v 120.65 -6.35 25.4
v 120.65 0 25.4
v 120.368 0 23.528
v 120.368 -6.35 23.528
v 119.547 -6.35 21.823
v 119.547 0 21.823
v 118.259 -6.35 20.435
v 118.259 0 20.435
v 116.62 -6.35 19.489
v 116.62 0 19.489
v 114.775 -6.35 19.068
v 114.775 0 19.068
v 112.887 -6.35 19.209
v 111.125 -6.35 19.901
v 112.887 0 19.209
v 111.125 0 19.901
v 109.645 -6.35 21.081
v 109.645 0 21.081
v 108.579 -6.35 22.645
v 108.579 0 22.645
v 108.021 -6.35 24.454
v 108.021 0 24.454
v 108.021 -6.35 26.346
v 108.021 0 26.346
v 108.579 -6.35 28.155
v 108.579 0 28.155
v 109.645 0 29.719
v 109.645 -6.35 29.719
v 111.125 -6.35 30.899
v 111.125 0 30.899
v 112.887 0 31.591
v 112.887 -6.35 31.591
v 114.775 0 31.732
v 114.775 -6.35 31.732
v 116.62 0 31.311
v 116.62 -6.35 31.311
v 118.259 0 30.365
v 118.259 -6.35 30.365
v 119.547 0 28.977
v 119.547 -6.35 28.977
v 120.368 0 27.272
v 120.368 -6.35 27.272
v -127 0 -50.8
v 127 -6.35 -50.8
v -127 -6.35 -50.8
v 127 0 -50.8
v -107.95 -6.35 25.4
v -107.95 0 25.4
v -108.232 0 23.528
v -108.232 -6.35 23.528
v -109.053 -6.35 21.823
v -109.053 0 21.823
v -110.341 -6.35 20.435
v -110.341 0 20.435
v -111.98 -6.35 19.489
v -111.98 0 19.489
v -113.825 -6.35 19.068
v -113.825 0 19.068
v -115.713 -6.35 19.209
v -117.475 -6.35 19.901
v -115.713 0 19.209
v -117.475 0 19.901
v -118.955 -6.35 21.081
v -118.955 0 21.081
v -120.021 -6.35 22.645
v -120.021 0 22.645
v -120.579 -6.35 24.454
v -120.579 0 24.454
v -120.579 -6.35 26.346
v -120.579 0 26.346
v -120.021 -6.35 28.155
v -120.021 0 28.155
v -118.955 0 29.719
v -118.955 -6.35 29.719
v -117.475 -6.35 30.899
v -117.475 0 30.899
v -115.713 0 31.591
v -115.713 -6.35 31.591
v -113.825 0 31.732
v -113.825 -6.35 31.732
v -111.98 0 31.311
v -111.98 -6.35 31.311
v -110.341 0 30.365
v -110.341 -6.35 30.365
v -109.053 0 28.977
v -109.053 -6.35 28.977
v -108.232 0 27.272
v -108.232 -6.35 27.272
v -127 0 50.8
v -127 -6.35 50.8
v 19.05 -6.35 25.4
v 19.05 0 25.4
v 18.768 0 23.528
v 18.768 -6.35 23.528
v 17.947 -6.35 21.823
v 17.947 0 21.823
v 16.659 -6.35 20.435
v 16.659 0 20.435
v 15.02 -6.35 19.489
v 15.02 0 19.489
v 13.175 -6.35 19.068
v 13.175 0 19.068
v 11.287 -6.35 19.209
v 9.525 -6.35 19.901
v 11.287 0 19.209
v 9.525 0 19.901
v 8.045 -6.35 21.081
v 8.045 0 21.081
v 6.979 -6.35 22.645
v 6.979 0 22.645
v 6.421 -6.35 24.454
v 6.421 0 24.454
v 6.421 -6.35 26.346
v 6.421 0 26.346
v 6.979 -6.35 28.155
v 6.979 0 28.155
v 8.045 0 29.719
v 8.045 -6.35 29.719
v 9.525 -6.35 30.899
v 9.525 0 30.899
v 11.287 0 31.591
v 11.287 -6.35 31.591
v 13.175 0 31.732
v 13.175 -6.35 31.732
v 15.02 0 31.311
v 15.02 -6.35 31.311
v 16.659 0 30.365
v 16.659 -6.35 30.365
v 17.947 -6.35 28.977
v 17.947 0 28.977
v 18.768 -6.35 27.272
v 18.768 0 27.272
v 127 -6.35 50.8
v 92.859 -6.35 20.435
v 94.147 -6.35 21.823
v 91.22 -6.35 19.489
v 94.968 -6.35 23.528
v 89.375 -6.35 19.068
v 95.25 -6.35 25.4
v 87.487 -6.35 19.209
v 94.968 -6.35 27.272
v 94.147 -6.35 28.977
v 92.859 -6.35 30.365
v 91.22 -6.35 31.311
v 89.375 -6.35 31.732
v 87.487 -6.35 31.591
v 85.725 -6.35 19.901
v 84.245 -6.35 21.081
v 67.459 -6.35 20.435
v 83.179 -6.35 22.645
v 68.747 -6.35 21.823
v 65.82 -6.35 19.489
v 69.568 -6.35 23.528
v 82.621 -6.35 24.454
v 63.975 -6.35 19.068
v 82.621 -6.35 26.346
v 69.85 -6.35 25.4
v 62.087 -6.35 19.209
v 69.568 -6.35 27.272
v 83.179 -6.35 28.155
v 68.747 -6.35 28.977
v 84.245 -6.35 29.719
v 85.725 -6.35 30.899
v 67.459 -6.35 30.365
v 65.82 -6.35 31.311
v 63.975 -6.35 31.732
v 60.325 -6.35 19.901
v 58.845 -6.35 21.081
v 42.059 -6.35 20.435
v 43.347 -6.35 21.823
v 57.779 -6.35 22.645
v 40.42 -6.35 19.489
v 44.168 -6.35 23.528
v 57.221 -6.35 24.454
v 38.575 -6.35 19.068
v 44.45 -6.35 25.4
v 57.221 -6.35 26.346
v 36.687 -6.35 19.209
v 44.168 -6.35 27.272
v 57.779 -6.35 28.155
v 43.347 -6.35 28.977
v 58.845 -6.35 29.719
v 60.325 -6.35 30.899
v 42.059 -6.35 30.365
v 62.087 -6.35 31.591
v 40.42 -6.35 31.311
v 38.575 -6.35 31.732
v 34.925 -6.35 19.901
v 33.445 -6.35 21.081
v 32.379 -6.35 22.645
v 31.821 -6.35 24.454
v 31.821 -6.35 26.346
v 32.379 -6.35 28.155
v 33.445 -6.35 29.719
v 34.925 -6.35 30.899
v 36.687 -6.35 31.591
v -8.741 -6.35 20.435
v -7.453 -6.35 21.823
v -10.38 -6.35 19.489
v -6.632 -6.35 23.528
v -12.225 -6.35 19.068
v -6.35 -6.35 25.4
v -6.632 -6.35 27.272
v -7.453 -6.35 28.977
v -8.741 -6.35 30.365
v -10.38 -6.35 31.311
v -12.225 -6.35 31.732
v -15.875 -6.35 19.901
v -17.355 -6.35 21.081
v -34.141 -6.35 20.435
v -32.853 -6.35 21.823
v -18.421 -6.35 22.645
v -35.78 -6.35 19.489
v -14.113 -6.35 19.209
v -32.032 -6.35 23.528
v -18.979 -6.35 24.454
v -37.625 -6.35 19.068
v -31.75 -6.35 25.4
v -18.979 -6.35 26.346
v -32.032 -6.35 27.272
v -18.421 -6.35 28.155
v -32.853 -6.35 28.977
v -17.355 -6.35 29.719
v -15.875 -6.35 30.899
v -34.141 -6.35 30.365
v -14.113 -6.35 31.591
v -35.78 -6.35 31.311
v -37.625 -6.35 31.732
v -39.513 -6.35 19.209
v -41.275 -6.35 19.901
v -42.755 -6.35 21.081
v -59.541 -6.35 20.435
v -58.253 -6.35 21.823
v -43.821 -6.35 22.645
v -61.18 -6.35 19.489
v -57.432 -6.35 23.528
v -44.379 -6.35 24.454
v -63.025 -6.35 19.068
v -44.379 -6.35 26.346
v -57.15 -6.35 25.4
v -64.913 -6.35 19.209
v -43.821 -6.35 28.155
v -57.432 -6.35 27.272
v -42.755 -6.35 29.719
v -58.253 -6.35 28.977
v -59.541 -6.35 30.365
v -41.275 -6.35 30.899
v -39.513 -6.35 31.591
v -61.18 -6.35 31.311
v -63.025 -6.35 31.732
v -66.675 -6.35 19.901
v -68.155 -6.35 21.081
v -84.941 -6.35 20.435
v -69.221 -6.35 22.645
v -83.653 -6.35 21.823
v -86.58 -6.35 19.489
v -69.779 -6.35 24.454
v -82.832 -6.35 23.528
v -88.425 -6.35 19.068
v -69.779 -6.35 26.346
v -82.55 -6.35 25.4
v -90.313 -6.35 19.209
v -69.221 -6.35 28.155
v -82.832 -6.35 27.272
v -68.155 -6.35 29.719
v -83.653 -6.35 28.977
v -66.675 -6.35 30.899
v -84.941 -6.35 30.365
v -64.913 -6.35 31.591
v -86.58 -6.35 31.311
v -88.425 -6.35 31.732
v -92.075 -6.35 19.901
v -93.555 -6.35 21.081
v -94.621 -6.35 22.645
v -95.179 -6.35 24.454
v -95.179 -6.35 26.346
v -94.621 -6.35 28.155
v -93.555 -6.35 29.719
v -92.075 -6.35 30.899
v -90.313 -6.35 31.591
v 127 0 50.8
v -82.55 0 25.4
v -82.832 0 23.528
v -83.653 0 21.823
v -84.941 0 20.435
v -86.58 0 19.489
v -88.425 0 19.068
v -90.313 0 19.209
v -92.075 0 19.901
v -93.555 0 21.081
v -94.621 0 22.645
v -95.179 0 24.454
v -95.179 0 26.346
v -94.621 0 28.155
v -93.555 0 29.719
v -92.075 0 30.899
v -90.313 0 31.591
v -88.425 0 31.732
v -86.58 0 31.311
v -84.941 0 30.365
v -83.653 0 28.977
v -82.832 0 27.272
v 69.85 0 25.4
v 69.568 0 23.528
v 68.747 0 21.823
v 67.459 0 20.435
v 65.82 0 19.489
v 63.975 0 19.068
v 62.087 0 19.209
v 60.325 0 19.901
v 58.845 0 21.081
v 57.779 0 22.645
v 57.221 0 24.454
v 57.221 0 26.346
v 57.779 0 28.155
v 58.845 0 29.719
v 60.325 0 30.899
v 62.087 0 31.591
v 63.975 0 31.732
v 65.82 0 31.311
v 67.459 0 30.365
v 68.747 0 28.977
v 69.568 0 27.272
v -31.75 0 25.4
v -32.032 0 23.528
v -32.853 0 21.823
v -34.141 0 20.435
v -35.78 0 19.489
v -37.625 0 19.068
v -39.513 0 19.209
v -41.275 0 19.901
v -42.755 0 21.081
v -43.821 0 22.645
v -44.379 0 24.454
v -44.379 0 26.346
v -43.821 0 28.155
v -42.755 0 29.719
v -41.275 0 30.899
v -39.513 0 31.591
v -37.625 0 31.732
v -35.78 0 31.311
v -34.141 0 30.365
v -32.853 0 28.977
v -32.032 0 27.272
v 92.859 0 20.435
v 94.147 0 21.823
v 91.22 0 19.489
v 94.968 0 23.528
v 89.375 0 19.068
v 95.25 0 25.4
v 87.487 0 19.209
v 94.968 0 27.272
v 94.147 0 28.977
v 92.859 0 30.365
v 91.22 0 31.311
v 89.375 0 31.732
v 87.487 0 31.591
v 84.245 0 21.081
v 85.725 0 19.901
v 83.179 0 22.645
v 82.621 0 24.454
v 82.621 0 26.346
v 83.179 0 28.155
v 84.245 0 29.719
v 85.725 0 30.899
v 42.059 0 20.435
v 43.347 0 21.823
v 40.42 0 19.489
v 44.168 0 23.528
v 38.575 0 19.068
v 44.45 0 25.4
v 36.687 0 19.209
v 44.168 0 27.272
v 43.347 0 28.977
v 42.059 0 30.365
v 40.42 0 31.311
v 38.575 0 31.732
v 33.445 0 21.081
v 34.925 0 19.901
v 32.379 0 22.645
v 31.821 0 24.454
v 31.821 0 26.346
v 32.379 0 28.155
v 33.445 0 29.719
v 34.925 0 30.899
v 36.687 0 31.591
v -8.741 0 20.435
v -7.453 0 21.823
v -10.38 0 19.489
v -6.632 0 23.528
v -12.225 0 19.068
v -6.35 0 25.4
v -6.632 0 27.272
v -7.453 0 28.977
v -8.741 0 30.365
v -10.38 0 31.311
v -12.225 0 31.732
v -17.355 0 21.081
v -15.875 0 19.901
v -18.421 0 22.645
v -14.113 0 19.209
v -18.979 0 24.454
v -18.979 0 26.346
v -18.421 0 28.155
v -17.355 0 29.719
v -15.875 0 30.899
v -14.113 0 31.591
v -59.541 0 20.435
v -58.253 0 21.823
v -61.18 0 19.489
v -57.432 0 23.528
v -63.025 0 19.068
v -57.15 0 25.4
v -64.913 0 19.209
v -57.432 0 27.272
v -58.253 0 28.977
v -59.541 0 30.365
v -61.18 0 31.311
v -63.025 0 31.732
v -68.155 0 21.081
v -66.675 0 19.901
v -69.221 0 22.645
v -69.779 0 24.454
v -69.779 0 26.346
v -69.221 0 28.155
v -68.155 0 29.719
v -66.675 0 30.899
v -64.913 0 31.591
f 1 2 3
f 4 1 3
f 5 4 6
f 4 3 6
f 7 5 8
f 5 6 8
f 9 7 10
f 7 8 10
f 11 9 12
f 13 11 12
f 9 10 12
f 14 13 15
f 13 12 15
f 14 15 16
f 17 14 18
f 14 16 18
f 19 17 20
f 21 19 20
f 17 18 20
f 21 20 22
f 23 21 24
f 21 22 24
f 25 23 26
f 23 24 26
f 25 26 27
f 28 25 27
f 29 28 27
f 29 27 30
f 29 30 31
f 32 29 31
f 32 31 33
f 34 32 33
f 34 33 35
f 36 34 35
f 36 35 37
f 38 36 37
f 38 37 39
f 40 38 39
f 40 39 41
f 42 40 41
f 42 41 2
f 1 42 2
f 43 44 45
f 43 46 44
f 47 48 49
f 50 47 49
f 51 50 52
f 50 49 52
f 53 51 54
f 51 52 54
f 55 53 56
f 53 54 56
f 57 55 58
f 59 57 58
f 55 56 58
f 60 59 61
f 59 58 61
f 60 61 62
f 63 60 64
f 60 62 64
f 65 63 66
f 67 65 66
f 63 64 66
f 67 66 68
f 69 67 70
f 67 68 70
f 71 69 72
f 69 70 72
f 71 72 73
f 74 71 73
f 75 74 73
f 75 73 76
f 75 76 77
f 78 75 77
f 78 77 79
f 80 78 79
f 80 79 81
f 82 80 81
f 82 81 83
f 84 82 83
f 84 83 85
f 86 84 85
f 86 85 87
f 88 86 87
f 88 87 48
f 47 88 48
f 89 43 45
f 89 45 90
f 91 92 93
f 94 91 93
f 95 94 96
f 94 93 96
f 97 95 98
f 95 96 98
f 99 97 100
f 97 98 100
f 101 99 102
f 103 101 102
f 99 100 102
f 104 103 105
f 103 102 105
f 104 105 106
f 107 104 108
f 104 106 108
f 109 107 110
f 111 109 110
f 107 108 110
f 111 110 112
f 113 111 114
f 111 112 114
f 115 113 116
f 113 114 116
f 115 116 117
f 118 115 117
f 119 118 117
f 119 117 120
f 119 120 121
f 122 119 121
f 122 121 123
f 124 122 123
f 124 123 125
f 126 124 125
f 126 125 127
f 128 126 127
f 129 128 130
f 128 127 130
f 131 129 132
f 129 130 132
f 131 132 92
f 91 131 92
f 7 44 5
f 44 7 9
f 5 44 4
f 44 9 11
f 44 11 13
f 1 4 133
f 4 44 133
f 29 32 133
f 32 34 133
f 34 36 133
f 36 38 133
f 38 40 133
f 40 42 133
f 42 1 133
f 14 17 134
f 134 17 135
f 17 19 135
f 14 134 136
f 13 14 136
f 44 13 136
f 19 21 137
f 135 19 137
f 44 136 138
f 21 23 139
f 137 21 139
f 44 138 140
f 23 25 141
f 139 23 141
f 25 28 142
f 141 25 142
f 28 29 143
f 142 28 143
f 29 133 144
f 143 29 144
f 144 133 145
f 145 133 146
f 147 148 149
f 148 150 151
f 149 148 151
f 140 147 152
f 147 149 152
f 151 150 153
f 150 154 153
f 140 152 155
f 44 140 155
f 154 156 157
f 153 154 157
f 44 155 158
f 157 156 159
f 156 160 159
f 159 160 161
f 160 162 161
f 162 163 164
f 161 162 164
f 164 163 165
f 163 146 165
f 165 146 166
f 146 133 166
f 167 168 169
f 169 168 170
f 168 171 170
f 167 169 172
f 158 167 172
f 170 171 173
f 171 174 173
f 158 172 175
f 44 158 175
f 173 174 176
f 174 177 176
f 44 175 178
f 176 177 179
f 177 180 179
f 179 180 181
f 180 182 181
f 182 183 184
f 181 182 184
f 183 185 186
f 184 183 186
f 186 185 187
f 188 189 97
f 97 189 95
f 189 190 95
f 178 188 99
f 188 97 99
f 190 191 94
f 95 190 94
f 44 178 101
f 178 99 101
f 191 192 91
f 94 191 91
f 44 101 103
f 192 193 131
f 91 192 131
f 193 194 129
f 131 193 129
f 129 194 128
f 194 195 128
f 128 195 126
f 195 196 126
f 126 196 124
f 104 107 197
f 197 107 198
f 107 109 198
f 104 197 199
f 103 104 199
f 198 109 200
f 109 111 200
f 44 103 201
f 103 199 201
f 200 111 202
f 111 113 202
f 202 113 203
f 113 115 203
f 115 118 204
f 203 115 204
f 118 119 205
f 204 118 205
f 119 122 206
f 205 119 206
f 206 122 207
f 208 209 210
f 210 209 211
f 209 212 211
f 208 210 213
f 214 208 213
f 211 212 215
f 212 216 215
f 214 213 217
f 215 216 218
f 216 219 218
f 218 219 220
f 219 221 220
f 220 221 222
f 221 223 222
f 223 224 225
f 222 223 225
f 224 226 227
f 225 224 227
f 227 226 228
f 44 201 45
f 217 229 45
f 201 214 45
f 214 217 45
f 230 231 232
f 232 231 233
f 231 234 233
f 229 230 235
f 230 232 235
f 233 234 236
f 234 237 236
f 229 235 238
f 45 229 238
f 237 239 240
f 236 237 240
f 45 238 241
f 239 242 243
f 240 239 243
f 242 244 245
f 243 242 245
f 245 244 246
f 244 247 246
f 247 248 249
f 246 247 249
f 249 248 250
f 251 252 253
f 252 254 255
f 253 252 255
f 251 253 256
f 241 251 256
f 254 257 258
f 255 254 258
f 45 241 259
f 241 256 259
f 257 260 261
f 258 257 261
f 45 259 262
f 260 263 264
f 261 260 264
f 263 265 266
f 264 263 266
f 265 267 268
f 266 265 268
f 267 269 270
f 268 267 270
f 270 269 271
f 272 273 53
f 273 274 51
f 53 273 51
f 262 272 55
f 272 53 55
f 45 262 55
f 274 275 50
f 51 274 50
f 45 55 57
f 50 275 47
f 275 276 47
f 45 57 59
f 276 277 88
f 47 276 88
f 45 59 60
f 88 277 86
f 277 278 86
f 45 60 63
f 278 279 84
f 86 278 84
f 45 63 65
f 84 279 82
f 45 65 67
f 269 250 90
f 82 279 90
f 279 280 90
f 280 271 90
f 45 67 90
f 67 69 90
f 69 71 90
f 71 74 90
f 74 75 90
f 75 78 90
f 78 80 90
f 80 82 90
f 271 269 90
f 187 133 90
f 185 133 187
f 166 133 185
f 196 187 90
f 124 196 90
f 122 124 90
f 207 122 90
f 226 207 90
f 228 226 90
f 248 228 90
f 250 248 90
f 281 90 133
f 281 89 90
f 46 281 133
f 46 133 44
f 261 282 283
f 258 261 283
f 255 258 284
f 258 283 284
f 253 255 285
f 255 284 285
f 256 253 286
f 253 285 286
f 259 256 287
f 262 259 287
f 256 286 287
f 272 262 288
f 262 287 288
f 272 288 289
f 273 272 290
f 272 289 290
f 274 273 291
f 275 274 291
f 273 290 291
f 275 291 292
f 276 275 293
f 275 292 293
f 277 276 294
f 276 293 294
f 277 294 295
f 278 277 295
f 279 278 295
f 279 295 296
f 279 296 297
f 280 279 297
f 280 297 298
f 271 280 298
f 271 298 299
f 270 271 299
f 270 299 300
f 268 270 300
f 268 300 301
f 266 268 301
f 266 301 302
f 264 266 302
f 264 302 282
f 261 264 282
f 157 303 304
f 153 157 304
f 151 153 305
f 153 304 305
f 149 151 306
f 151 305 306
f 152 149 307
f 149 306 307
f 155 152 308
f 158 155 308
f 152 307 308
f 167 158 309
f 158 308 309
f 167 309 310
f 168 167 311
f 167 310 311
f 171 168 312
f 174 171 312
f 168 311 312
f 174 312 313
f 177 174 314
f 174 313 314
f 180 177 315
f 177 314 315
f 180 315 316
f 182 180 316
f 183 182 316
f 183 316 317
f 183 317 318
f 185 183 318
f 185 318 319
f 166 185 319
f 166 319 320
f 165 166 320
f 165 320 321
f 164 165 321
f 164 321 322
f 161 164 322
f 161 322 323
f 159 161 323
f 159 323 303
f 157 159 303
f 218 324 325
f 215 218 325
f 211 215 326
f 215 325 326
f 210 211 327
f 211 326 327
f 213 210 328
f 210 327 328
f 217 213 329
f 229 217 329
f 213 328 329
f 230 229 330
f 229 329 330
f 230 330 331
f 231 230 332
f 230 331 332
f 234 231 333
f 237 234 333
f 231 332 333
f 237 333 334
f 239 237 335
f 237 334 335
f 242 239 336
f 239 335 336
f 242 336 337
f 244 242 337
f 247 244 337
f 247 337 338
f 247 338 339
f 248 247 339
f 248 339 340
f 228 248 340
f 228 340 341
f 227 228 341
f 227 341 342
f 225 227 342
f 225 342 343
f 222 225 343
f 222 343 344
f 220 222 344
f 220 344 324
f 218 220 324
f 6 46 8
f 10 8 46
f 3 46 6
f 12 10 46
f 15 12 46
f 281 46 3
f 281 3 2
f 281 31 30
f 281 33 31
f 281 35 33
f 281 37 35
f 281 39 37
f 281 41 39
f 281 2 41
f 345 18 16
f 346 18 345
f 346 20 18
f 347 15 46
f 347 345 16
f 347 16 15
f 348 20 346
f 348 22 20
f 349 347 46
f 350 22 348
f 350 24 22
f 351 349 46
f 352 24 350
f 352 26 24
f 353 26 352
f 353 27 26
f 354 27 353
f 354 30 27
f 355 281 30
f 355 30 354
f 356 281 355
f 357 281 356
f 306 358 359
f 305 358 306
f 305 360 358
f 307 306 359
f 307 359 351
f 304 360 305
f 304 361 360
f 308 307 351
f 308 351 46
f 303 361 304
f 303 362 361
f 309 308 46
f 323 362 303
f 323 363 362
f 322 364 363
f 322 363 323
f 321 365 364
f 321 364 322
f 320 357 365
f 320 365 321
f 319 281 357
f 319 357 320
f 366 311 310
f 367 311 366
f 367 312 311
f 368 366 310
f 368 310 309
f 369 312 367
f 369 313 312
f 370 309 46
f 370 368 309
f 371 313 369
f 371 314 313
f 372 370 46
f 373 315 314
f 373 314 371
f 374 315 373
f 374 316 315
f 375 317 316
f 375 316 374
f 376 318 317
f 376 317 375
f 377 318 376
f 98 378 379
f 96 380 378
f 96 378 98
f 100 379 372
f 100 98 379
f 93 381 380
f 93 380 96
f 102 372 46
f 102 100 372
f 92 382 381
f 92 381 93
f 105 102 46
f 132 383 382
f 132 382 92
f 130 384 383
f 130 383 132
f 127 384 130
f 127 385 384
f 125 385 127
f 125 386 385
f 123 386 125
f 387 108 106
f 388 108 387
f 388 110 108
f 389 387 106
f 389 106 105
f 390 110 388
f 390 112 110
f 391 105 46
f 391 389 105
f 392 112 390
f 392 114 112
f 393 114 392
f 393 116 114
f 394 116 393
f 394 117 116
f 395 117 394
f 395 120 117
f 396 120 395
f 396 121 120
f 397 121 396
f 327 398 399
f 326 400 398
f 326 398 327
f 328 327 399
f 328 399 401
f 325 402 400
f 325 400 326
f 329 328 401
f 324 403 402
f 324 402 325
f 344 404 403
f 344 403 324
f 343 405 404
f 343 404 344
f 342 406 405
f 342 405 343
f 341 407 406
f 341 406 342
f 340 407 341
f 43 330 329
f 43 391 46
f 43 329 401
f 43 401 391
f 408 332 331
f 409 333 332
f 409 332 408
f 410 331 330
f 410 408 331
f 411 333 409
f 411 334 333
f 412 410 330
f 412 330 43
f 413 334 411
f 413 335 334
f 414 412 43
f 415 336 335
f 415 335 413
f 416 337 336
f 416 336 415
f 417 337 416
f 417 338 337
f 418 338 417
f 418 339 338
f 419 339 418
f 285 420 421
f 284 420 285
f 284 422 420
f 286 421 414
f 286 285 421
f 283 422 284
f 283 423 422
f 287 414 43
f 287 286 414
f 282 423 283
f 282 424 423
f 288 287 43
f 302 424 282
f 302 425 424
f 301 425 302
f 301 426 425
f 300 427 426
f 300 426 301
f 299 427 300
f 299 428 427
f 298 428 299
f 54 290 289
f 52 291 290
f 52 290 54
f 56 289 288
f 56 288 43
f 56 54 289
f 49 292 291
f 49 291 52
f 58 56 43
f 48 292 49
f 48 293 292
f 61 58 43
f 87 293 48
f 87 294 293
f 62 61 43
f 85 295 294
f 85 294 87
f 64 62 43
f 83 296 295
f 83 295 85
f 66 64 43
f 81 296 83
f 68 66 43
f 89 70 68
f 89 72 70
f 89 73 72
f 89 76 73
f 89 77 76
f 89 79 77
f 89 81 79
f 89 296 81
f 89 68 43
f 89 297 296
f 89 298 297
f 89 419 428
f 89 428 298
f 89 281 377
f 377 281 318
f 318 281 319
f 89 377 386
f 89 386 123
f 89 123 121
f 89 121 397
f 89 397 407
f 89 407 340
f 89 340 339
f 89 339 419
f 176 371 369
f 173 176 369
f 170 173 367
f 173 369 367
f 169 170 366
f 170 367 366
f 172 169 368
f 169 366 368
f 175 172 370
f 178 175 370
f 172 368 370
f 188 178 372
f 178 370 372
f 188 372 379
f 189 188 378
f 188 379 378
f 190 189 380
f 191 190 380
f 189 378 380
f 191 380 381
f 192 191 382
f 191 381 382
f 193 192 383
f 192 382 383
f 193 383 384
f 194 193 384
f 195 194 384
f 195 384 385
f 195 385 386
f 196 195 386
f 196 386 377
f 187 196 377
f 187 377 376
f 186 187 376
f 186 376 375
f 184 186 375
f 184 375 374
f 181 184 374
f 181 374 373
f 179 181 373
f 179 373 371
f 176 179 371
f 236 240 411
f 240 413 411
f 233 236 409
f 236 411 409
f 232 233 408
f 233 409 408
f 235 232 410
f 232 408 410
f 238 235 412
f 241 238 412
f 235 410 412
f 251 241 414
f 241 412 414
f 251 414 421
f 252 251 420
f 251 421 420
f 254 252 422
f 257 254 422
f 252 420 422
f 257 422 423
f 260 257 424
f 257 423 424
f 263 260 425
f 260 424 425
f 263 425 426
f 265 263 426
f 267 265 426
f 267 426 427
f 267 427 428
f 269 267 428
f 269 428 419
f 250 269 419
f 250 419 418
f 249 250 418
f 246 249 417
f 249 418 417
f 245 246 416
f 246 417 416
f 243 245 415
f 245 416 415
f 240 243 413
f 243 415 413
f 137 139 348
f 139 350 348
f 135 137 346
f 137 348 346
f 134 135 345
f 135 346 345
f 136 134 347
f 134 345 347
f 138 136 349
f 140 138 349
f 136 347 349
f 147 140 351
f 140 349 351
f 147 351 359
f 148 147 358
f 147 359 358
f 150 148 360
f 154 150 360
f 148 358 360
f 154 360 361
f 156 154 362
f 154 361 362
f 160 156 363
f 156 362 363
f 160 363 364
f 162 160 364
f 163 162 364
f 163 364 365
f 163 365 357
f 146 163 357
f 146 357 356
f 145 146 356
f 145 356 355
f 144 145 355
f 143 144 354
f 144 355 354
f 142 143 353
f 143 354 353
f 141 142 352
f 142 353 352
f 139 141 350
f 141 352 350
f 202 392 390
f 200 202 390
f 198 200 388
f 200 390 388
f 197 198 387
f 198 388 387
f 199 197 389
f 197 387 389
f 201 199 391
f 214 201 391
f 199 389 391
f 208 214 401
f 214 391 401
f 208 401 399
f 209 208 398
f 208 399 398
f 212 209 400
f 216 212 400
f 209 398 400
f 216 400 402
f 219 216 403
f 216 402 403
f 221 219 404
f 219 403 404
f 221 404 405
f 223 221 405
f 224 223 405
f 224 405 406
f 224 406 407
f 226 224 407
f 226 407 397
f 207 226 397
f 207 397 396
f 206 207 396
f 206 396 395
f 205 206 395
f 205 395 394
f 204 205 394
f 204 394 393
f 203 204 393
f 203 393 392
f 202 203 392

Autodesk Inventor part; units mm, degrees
ref_plane "YZ Plane" through (0, 0, 0) normal (1, 0, 0) x (0, 1, 0)
ref_plane "XZ Plane" through (0, 0, 0) normal (0, 1, 0) x (-1, 0, 0)
ref_plane "XY Plane" through (0, 0, 0) normal (0, 0, 1) x (1, 0, 0)
sketch "Sketch1" plane through (0, 0, 0) normal (0, 1, 0) x (-1, 0, 0)
  line L0 (127, 50.8) -> (-127, 50.8)
  line L1 (-127, 50.8) -> (-127, -50.8)
  line L2 (-127, -50.8) -> (127, -50.8)
  line L3 (127, -50.8) -> (127, 50.8)
  line L4 (127, 50.8) -> (-127, -50.8) construction
  line L5 (-127, 50.8) -> (127, -50.8) construction
  point P0 (0, 0)
  dimension "d3" = 101.6
  dimension "d13" = 254
extrude "Extrusion1" add sketch "Sketch1" against normal blind 6.35
sketch "Sketch3" plane through (0, 0, 0) normal (0, 1, 0) x (1, 0, 0)
  line L0 (-127, -50.8) -> (-127, 50.8) construction
  line L1 (-127, -25.4) -> (127, -25.4) construction
  line L2 (127, 50.8) -> (127, -50.8) construction
  line L3 (127, 50.8) -> (-127, 50.8) construction
  circle A0 centre (-114.3, -25.4) radius 6.35
  circle A1 centre (-88.9, -25.4) radius 6.35
  circle A2 centre (-63.5, -25.4) radius 6.35
  circle A3 centre (-38.1, -25.4) radius 6.35
  circle A4 centre (-12.7, -25.4) radius 6.35
  circle A5 centre (12.7, -25.4) radius 6.35
  circle A6 centre (38.1, -25.4) radius 6.35
  circle A7 centre (63.5, -25.4) radius 6.35
  circle A8 centre (88.9, -25.4) radius 6.35
  circle A9 centre (114.3, -25.4) radius 6.35
  point P0 (0, 0)
  dimension "d2" = 76.2
  dimension "d4" = 12.7
  dimension "d5" = 12.7
  dimension "d8" = 25.4
extrude "Extrusion2" cut sketch "Sketch3" against normal through all
properties part number "10-holes"
